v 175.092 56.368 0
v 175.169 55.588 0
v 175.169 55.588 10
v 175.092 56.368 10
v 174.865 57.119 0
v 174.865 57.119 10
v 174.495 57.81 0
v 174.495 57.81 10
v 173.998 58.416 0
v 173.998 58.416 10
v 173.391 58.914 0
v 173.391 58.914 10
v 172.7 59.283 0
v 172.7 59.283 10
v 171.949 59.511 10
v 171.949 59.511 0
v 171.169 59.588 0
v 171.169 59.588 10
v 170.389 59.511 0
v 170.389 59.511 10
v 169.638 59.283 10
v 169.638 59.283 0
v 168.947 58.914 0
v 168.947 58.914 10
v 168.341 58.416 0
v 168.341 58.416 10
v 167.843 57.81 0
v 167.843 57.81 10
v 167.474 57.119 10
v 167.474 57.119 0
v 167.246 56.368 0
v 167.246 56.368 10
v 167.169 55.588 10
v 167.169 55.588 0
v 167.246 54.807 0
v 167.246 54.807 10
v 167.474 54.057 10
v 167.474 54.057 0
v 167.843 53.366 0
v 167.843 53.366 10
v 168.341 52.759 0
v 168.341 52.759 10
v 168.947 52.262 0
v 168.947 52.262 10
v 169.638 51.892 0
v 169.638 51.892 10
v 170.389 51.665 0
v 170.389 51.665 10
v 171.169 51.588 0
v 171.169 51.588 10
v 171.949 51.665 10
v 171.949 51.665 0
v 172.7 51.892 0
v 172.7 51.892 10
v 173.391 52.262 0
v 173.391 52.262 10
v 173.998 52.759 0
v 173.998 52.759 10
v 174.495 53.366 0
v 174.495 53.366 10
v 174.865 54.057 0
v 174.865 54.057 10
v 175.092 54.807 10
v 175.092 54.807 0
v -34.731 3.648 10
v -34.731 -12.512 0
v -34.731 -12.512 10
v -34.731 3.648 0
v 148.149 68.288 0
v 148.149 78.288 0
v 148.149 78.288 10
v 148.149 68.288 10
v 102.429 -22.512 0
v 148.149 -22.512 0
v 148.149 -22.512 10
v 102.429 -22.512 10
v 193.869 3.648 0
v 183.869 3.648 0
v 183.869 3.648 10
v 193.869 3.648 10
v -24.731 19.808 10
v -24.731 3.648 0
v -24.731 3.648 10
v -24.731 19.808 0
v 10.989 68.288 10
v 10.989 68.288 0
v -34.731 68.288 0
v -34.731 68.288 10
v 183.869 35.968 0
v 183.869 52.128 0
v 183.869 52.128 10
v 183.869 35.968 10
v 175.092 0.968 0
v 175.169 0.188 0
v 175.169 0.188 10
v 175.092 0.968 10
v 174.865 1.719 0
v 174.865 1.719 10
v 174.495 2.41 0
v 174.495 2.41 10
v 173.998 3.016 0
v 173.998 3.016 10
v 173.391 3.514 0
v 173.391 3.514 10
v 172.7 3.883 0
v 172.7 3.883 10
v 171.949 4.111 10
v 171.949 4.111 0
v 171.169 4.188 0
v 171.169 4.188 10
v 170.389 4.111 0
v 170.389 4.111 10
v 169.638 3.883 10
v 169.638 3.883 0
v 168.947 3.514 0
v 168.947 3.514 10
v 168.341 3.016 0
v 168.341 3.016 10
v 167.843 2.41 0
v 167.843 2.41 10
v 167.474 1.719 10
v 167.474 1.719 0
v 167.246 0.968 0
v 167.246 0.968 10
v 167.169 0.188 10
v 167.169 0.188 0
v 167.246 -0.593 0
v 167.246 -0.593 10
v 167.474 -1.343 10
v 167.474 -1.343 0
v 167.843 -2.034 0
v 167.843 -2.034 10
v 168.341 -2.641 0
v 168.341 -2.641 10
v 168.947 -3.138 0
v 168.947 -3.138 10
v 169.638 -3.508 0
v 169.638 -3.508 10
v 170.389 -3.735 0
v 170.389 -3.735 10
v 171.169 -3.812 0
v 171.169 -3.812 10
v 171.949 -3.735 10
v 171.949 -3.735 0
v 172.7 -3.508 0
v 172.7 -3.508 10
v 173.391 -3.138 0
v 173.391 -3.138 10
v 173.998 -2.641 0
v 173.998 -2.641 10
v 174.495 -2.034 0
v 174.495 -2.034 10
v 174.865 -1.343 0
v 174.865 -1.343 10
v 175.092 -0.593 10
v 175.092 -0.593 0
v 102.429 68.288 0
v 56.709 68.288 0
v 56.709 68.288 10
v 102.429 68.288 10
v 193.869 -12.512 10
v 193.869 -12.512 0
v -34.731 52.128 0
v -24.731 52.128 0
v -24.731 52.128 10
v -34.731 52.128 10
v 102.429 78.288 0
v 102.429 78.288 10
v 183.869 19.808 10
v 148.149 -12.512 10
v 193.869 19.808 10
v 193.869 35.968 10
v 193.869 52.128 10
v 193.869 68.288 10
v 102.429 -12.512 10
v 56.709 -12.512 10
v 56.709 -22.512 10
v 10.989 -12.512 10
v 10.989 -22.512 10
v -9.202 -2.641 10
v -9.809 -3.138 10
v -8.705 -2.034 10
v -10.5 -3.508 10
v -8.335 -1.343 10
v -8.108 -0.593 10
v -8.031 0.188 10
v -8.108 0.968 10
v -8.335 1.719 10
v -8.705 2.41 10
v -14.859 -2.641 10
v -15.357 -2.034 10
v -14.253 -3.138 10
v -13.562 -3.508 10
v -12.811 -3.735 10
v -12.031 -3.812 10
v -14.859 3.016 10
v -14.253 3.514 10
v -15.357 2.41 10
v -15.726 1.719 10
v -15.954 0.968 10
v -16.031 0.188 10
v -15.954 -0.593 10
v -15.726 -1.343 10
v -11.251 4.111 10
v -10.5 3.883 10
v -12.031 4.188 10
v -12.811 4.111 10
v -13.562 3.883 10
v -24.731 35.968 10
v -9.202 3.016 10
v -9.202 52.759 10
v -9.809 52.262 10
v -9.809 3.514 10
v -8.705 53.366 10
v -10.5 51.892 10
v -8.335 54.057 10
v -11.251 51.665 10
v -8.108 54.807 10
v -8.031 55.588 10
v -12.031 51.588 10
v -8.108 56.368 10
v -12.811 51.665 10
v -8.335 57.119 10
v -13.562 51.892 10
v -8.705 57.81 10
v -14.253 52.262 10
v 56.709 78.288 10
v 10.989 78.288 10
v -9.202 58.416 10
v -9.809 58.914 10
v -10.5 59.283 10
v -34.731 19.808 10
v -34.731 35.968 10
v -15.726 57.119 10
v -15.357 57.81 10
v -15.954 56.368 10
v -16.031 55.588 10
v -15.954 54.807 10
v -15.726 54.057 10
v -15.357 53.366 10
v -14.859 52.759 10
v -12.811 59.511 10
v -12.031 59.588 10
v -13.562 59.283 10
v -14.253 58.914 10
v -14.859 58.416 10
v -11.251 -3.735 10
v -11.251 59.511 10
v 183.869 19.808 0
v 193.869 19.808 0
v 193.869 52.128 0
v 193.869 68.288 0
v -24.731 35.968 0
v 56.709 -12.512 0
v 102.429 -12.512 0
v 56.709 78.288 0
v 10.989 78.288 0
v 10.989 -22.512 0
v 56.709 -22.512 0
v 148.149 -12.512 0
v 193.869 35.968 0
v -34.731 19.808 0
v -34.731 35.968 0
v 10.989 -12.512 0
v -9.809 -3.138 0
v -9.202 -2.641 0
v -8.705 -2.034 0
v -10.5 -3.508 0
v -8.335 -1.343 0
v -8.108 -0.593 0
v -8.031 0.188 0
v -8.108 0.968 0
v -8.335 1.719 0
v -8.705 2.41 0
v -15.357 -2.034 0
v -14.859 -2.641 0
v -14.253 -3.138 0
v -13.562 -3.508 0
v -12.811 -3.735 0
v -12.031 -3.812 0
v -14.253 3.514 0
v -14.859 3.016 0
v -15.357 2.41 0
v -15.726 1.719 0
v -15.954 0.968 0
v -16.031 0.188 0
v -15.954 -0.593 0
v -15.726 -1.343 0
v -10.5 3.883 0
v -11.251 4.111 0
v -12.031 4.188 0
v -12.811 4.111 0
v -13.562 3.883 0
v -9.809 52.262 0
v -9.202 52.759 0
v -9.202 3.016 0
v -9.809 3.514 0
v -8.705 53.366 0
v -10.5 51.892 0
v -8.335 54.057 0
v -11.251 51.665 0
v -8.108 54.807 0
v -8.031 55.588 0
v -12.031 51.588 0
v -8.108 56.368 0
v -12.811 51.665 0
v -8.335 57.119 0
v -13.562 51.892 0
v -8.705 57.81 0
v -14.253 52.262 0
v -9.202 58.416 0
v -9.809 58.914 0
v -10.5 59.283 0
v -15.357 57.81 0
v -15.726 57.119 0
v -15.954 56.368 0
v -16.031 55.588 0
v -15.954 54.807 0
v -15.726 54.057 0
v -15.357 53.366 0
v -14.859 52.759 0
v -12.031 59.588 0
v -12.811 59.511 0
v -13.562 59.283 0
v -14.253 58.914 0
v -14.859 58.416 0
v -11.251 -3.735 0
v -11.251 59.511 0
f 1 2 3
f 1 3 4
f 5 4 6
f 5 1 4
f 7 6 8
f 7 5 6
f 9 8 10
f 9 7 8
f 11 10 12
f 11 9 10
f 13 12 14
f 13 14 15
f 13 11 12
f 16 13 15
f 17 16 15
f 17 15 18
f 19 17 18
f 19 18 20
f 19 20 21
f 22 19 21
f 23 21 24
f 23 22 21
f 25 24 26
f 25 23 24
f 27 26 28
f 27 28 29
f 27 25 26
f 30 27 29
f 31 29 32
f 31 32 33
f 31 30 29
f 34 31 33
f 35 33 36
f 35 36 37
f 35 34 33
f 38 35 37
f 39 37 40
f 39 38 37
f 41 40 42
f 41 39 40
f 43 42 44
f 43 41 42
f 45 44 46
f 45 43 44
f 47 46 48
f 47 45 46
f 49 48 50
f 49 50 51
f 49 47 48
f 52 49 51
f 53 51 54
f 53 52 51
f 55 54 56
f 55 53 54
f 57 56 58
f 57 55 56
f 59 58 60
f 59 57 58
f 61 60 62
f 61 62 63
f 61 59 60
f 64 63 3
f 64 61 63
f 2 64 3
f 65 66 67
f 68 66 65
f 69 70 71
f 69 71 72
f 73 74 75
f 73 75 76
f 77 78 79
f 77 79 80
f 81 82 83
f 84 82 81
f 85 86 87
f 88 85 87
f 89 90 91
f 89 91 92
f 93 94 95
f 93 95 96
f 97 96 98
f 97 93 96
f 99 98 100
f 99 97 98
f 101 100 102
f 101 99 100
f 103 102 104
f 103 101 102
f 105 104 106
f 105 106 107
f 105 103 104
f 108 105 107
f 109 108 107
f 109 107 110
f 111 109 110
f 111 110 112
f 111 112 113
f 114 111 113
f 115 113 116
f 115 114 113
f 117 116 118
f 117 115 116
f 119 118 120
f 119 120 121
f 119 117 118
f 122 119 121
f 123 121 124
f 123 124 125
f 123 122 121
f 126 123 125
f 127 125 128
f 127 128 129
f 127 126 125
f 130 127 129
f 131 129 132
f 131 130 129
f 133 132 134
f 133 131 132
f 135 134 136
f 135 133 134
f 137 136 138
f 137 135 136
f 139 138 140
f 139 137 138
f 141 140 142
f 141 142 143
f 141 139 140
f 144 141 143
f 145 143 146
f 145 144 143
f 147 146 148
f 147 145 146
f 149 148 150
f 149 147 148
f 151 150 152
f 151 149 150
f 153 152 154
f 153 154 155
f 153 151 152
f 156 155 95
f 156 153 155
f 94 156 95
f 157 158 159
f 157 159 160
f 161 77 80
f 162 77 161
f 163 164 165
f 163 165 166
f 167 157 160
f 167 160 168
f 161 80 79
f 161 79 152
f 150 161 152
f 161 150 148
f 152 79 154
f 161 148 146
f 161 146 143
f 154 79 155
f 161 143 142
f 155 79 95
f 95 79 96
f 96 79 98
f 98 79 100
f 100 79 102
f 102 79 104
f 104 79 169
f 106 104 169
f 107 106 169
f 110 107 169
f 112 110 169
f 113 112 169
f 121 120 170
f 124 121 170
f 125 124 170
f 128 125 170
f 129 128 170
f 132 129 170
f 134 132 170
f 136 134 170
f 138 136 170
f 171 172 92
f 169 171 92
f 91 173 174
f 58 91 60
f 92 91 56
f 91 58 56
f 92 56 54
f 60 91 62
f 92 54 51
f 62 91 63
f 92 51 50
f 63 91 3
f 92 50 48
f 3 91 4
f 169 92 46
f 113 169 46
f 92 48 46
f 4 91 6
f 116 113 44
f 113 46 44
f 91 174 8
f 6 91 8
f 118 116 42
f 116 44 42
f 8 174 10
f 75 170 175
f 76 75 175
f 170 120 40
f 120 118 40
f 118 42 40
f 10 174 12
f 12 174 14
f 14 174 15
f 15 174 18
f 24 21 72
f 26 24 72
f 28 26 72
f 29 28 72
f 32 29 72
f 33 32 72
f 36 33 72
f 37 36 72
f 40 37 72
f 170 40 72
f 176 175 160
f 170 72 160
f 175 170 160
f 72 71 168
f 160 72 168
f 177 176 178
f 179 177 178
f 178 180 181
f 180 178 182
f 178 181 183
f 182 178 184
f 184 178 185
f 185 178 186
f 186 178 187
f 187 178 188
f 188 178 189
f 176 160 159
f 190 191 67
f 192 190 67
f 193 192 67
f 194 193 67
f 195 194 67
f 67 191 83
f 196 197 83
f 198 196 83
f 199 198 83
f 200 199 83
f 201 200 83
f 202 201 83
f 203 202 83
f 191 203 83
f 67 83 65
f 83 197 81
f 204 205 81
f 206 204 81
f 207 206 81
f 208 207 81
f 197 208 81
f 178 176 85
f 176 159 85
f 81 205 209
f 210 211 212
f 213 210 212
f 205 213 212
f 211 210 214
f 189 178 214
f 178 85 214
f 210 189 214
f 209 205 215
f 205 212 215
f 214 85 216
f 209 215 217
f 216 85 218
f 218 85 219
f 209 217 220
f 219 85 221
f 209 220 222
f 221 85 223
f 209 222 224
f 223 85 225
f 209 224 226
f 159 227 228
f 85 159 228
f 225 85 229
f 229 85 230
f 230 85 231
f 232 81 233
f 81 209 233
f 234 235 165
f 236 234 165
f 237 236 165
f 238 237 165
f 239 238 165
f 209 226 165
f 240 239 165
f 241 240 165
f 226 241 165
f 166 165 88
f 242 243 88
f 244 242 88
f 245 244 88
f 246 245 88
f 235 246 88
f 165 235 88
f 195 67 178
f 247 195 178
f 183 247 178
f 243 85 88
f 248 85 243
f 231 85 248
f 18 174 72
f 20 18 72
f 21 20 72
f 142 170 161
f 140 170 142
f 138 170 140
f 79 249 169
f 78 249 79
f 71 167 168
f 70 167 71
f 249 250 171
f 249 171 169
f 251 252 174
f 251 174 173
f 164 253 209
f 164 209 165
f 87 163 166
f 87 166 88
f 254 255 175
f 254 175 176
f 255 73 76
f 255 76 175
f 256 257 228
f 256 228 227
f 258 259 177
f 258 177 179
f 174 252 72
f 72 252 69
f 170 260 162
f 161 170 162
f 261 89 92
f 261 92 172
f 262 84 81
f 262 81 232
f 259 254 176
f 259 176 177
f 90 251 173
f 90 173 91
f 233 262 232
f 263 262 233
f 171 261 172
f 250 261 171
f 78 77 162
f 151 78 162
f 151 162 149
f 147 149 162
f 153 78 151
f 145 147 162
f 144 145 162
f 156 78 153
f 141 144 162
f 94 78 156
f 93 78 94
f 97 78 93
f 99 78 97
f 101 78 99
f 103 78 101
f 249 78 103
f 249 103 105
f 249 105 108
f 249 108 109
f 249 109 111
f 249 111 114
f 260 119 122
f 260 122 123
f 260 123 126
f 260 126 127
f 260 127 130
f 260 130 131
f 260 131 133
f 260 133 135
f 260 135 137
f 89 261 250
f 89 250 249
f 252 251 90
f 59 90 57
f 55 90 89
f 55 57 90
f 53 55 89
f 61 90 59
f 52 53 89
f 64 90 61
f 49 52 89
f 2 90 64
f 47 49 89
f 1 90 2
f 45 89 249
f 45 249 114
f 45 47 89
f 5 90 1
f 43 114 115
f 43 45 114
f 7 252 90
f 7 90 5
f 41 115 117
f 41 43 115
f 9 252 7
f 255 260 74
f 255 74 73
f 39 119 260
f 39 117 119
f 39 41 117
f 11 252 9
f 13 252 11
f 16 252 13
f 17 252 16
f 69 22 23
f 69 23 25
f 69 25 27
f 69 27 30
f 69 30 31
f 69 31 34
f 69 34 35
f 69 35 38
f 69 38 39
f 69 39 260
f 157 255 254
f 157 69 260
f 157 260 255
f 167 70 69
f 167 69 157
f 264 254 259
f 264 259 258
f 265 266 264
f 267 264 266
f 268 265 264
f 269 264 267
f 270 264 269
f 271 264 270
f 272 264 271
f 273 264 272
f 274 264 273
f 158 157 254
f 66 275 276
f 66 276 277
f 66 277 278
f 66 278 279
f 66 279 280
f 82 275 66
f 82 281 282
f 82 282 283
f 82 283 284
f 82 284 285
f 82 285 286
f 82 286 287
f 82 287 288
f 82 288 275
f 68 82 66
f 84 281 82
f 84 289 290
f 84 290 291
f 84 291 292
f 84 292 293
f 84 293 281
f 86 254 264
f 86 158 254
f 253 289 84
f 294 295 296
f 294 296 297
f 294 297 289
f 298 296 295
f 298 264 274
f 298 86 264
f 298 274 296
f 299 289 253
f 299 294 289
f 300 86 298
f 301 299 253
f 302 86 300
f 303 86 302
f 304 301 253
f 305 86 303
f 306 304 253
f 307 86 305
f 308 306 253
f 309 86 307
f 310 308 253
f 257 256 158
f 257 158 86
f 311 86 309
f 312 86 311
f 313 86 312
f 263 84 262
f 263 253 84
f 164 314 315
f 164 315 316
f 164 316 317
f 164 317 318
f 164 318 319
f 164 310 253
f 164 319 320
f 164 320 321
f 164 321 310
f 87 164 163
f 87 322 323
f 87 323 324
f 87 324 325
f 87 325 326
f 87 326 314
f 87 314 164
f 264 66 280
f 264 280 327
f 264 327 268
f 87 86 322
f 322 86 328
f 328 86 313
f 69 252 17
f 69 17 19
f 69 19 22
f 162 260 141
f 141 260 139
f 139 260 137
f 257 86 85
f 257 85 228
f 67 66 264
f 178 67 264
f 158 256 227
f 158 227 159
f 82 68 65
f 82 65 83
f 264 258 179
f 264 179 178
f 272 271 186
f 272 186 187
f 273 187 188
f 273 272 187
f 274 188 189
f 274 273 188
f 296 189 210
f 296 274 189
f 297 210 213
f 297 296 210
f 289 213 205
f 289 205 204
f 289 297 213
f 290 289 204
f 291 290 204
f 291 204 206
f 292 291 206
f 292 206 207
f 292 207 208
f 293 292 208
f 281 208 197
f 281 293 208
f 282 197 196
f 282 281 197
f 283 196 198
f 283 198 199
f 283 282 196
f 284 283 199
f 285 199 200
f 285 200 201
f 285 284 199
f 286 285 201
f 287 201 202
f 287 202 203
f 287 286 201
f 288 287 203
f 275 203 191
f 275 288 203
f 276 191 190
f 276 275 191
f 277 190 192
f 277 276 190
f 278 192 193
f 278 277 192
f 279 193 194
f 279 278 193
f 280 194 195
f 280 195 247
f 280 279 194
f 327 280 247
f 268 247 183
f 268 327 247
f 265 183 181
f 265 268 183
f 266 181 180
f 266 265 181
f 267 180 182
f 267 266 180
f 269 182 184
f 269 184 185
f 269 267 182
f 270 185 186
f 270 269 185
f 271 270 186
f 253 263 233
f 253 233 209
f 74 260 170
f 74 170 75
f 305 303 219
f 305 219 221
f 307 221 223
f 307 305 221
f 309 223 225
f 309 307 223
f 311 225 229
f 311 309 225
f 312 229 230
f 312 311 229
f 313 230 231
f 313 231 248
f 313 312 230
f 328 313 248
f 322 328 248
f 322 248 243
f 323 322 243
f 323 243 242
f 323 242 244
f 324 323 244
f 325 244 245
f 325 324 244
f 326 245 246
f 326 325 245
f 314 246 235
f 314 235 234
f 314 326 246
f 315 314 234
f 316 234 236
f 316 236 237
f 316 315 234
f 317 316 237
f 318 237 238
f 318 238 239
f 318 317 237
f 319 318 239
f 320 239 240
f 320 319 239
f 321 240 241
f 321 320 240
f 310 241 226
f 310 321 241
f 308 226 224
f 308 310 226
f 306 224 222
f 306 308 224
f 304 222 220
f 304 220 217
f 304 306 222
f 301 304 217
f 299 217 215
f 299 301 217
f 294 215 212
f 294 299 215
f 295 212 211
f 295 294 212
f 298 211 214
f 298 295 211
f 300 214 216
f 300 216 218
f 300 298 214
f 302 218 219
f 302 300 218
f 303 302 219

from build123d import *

# Parameters (mm, degrees)
SKETCH3_R           = 4
BOSS_EXTRUDE2_DEPTH = 10


with BuildPart() as part:
    # Sketch3 → Boss-Extrude2 (new body)
    with BuildSketch(Plane.XY):
        Polygon((102.429124183, -12.51217232), (56.709124183, -12.51217232), (56.709124183, -22.51217232), (10.989124183, -22.51217232), (10.989124183, -12.51217232), (-24.730875817, -12.51217232), (-34.730875817, -12.51217232), (-34.730875817, 3.64782768), (-24.730875817, 3.64782768), (-24.730875817, 19.80782768), (-34.730875817, 19.80782768), (-34.730875817, 35.96782768), (-24.730875817, 35.96782768), (-24.730875817, 52.12782768), (-34.730875817, 52.12782768), (-34.730875817, 68.28782768), (-24.730875817, 68.28782768), (10.989124183, 68.28782768), (10.989124183, 78.28782768), (56.709124183, 78.28782768), (56.709124183, 68.28782768), (102.429124183, 68.28782768), (102.429124183, 78.28782768), (148.149124183, 78.28782768), (148.149124183, 68.28782768), (183.869124183, 68.28782768), (193.869124183, 68.28782768), (193.869124183, 52.12782768), (183.869124183, 52.12782768), (183.869124183, 35.96782768), (193.869124183, 35.96782768), (193.869124183, 19.80782768), (183.869124183, 19.80782768), (183.869124183, 3.64782768), (193.869124183, 3.64782768), (193.869124183, -12.51217232), (183.869124183, -12.51217232), (148.149124183, -12.51217232), (148.149124183, -22.51217232), (102.429124183, -22.51217232), align=None)
        with Locations((-12.030875817, 55.58782768)):
            Circle(SKETCH3_R, mode=Mode.SUBTRACT)
        with Locations((171.169124183, 55.58782768)):
            Circle(SKETCH3_R, mode=Mode.SUBTRACT)
        with Locations((-12.030875817, 0.18782768)):
            Circle(SKETCH3_R, mode=Mode.SUBTRACT)
        with Locations((171.169124183, 0.18782768)):
            Circle(SKETCH3_R, mode=Mode.SUBTRACT)
    extrude(amount=BOSS_EXTRUDE2_DEPTH)


solid = part.part
